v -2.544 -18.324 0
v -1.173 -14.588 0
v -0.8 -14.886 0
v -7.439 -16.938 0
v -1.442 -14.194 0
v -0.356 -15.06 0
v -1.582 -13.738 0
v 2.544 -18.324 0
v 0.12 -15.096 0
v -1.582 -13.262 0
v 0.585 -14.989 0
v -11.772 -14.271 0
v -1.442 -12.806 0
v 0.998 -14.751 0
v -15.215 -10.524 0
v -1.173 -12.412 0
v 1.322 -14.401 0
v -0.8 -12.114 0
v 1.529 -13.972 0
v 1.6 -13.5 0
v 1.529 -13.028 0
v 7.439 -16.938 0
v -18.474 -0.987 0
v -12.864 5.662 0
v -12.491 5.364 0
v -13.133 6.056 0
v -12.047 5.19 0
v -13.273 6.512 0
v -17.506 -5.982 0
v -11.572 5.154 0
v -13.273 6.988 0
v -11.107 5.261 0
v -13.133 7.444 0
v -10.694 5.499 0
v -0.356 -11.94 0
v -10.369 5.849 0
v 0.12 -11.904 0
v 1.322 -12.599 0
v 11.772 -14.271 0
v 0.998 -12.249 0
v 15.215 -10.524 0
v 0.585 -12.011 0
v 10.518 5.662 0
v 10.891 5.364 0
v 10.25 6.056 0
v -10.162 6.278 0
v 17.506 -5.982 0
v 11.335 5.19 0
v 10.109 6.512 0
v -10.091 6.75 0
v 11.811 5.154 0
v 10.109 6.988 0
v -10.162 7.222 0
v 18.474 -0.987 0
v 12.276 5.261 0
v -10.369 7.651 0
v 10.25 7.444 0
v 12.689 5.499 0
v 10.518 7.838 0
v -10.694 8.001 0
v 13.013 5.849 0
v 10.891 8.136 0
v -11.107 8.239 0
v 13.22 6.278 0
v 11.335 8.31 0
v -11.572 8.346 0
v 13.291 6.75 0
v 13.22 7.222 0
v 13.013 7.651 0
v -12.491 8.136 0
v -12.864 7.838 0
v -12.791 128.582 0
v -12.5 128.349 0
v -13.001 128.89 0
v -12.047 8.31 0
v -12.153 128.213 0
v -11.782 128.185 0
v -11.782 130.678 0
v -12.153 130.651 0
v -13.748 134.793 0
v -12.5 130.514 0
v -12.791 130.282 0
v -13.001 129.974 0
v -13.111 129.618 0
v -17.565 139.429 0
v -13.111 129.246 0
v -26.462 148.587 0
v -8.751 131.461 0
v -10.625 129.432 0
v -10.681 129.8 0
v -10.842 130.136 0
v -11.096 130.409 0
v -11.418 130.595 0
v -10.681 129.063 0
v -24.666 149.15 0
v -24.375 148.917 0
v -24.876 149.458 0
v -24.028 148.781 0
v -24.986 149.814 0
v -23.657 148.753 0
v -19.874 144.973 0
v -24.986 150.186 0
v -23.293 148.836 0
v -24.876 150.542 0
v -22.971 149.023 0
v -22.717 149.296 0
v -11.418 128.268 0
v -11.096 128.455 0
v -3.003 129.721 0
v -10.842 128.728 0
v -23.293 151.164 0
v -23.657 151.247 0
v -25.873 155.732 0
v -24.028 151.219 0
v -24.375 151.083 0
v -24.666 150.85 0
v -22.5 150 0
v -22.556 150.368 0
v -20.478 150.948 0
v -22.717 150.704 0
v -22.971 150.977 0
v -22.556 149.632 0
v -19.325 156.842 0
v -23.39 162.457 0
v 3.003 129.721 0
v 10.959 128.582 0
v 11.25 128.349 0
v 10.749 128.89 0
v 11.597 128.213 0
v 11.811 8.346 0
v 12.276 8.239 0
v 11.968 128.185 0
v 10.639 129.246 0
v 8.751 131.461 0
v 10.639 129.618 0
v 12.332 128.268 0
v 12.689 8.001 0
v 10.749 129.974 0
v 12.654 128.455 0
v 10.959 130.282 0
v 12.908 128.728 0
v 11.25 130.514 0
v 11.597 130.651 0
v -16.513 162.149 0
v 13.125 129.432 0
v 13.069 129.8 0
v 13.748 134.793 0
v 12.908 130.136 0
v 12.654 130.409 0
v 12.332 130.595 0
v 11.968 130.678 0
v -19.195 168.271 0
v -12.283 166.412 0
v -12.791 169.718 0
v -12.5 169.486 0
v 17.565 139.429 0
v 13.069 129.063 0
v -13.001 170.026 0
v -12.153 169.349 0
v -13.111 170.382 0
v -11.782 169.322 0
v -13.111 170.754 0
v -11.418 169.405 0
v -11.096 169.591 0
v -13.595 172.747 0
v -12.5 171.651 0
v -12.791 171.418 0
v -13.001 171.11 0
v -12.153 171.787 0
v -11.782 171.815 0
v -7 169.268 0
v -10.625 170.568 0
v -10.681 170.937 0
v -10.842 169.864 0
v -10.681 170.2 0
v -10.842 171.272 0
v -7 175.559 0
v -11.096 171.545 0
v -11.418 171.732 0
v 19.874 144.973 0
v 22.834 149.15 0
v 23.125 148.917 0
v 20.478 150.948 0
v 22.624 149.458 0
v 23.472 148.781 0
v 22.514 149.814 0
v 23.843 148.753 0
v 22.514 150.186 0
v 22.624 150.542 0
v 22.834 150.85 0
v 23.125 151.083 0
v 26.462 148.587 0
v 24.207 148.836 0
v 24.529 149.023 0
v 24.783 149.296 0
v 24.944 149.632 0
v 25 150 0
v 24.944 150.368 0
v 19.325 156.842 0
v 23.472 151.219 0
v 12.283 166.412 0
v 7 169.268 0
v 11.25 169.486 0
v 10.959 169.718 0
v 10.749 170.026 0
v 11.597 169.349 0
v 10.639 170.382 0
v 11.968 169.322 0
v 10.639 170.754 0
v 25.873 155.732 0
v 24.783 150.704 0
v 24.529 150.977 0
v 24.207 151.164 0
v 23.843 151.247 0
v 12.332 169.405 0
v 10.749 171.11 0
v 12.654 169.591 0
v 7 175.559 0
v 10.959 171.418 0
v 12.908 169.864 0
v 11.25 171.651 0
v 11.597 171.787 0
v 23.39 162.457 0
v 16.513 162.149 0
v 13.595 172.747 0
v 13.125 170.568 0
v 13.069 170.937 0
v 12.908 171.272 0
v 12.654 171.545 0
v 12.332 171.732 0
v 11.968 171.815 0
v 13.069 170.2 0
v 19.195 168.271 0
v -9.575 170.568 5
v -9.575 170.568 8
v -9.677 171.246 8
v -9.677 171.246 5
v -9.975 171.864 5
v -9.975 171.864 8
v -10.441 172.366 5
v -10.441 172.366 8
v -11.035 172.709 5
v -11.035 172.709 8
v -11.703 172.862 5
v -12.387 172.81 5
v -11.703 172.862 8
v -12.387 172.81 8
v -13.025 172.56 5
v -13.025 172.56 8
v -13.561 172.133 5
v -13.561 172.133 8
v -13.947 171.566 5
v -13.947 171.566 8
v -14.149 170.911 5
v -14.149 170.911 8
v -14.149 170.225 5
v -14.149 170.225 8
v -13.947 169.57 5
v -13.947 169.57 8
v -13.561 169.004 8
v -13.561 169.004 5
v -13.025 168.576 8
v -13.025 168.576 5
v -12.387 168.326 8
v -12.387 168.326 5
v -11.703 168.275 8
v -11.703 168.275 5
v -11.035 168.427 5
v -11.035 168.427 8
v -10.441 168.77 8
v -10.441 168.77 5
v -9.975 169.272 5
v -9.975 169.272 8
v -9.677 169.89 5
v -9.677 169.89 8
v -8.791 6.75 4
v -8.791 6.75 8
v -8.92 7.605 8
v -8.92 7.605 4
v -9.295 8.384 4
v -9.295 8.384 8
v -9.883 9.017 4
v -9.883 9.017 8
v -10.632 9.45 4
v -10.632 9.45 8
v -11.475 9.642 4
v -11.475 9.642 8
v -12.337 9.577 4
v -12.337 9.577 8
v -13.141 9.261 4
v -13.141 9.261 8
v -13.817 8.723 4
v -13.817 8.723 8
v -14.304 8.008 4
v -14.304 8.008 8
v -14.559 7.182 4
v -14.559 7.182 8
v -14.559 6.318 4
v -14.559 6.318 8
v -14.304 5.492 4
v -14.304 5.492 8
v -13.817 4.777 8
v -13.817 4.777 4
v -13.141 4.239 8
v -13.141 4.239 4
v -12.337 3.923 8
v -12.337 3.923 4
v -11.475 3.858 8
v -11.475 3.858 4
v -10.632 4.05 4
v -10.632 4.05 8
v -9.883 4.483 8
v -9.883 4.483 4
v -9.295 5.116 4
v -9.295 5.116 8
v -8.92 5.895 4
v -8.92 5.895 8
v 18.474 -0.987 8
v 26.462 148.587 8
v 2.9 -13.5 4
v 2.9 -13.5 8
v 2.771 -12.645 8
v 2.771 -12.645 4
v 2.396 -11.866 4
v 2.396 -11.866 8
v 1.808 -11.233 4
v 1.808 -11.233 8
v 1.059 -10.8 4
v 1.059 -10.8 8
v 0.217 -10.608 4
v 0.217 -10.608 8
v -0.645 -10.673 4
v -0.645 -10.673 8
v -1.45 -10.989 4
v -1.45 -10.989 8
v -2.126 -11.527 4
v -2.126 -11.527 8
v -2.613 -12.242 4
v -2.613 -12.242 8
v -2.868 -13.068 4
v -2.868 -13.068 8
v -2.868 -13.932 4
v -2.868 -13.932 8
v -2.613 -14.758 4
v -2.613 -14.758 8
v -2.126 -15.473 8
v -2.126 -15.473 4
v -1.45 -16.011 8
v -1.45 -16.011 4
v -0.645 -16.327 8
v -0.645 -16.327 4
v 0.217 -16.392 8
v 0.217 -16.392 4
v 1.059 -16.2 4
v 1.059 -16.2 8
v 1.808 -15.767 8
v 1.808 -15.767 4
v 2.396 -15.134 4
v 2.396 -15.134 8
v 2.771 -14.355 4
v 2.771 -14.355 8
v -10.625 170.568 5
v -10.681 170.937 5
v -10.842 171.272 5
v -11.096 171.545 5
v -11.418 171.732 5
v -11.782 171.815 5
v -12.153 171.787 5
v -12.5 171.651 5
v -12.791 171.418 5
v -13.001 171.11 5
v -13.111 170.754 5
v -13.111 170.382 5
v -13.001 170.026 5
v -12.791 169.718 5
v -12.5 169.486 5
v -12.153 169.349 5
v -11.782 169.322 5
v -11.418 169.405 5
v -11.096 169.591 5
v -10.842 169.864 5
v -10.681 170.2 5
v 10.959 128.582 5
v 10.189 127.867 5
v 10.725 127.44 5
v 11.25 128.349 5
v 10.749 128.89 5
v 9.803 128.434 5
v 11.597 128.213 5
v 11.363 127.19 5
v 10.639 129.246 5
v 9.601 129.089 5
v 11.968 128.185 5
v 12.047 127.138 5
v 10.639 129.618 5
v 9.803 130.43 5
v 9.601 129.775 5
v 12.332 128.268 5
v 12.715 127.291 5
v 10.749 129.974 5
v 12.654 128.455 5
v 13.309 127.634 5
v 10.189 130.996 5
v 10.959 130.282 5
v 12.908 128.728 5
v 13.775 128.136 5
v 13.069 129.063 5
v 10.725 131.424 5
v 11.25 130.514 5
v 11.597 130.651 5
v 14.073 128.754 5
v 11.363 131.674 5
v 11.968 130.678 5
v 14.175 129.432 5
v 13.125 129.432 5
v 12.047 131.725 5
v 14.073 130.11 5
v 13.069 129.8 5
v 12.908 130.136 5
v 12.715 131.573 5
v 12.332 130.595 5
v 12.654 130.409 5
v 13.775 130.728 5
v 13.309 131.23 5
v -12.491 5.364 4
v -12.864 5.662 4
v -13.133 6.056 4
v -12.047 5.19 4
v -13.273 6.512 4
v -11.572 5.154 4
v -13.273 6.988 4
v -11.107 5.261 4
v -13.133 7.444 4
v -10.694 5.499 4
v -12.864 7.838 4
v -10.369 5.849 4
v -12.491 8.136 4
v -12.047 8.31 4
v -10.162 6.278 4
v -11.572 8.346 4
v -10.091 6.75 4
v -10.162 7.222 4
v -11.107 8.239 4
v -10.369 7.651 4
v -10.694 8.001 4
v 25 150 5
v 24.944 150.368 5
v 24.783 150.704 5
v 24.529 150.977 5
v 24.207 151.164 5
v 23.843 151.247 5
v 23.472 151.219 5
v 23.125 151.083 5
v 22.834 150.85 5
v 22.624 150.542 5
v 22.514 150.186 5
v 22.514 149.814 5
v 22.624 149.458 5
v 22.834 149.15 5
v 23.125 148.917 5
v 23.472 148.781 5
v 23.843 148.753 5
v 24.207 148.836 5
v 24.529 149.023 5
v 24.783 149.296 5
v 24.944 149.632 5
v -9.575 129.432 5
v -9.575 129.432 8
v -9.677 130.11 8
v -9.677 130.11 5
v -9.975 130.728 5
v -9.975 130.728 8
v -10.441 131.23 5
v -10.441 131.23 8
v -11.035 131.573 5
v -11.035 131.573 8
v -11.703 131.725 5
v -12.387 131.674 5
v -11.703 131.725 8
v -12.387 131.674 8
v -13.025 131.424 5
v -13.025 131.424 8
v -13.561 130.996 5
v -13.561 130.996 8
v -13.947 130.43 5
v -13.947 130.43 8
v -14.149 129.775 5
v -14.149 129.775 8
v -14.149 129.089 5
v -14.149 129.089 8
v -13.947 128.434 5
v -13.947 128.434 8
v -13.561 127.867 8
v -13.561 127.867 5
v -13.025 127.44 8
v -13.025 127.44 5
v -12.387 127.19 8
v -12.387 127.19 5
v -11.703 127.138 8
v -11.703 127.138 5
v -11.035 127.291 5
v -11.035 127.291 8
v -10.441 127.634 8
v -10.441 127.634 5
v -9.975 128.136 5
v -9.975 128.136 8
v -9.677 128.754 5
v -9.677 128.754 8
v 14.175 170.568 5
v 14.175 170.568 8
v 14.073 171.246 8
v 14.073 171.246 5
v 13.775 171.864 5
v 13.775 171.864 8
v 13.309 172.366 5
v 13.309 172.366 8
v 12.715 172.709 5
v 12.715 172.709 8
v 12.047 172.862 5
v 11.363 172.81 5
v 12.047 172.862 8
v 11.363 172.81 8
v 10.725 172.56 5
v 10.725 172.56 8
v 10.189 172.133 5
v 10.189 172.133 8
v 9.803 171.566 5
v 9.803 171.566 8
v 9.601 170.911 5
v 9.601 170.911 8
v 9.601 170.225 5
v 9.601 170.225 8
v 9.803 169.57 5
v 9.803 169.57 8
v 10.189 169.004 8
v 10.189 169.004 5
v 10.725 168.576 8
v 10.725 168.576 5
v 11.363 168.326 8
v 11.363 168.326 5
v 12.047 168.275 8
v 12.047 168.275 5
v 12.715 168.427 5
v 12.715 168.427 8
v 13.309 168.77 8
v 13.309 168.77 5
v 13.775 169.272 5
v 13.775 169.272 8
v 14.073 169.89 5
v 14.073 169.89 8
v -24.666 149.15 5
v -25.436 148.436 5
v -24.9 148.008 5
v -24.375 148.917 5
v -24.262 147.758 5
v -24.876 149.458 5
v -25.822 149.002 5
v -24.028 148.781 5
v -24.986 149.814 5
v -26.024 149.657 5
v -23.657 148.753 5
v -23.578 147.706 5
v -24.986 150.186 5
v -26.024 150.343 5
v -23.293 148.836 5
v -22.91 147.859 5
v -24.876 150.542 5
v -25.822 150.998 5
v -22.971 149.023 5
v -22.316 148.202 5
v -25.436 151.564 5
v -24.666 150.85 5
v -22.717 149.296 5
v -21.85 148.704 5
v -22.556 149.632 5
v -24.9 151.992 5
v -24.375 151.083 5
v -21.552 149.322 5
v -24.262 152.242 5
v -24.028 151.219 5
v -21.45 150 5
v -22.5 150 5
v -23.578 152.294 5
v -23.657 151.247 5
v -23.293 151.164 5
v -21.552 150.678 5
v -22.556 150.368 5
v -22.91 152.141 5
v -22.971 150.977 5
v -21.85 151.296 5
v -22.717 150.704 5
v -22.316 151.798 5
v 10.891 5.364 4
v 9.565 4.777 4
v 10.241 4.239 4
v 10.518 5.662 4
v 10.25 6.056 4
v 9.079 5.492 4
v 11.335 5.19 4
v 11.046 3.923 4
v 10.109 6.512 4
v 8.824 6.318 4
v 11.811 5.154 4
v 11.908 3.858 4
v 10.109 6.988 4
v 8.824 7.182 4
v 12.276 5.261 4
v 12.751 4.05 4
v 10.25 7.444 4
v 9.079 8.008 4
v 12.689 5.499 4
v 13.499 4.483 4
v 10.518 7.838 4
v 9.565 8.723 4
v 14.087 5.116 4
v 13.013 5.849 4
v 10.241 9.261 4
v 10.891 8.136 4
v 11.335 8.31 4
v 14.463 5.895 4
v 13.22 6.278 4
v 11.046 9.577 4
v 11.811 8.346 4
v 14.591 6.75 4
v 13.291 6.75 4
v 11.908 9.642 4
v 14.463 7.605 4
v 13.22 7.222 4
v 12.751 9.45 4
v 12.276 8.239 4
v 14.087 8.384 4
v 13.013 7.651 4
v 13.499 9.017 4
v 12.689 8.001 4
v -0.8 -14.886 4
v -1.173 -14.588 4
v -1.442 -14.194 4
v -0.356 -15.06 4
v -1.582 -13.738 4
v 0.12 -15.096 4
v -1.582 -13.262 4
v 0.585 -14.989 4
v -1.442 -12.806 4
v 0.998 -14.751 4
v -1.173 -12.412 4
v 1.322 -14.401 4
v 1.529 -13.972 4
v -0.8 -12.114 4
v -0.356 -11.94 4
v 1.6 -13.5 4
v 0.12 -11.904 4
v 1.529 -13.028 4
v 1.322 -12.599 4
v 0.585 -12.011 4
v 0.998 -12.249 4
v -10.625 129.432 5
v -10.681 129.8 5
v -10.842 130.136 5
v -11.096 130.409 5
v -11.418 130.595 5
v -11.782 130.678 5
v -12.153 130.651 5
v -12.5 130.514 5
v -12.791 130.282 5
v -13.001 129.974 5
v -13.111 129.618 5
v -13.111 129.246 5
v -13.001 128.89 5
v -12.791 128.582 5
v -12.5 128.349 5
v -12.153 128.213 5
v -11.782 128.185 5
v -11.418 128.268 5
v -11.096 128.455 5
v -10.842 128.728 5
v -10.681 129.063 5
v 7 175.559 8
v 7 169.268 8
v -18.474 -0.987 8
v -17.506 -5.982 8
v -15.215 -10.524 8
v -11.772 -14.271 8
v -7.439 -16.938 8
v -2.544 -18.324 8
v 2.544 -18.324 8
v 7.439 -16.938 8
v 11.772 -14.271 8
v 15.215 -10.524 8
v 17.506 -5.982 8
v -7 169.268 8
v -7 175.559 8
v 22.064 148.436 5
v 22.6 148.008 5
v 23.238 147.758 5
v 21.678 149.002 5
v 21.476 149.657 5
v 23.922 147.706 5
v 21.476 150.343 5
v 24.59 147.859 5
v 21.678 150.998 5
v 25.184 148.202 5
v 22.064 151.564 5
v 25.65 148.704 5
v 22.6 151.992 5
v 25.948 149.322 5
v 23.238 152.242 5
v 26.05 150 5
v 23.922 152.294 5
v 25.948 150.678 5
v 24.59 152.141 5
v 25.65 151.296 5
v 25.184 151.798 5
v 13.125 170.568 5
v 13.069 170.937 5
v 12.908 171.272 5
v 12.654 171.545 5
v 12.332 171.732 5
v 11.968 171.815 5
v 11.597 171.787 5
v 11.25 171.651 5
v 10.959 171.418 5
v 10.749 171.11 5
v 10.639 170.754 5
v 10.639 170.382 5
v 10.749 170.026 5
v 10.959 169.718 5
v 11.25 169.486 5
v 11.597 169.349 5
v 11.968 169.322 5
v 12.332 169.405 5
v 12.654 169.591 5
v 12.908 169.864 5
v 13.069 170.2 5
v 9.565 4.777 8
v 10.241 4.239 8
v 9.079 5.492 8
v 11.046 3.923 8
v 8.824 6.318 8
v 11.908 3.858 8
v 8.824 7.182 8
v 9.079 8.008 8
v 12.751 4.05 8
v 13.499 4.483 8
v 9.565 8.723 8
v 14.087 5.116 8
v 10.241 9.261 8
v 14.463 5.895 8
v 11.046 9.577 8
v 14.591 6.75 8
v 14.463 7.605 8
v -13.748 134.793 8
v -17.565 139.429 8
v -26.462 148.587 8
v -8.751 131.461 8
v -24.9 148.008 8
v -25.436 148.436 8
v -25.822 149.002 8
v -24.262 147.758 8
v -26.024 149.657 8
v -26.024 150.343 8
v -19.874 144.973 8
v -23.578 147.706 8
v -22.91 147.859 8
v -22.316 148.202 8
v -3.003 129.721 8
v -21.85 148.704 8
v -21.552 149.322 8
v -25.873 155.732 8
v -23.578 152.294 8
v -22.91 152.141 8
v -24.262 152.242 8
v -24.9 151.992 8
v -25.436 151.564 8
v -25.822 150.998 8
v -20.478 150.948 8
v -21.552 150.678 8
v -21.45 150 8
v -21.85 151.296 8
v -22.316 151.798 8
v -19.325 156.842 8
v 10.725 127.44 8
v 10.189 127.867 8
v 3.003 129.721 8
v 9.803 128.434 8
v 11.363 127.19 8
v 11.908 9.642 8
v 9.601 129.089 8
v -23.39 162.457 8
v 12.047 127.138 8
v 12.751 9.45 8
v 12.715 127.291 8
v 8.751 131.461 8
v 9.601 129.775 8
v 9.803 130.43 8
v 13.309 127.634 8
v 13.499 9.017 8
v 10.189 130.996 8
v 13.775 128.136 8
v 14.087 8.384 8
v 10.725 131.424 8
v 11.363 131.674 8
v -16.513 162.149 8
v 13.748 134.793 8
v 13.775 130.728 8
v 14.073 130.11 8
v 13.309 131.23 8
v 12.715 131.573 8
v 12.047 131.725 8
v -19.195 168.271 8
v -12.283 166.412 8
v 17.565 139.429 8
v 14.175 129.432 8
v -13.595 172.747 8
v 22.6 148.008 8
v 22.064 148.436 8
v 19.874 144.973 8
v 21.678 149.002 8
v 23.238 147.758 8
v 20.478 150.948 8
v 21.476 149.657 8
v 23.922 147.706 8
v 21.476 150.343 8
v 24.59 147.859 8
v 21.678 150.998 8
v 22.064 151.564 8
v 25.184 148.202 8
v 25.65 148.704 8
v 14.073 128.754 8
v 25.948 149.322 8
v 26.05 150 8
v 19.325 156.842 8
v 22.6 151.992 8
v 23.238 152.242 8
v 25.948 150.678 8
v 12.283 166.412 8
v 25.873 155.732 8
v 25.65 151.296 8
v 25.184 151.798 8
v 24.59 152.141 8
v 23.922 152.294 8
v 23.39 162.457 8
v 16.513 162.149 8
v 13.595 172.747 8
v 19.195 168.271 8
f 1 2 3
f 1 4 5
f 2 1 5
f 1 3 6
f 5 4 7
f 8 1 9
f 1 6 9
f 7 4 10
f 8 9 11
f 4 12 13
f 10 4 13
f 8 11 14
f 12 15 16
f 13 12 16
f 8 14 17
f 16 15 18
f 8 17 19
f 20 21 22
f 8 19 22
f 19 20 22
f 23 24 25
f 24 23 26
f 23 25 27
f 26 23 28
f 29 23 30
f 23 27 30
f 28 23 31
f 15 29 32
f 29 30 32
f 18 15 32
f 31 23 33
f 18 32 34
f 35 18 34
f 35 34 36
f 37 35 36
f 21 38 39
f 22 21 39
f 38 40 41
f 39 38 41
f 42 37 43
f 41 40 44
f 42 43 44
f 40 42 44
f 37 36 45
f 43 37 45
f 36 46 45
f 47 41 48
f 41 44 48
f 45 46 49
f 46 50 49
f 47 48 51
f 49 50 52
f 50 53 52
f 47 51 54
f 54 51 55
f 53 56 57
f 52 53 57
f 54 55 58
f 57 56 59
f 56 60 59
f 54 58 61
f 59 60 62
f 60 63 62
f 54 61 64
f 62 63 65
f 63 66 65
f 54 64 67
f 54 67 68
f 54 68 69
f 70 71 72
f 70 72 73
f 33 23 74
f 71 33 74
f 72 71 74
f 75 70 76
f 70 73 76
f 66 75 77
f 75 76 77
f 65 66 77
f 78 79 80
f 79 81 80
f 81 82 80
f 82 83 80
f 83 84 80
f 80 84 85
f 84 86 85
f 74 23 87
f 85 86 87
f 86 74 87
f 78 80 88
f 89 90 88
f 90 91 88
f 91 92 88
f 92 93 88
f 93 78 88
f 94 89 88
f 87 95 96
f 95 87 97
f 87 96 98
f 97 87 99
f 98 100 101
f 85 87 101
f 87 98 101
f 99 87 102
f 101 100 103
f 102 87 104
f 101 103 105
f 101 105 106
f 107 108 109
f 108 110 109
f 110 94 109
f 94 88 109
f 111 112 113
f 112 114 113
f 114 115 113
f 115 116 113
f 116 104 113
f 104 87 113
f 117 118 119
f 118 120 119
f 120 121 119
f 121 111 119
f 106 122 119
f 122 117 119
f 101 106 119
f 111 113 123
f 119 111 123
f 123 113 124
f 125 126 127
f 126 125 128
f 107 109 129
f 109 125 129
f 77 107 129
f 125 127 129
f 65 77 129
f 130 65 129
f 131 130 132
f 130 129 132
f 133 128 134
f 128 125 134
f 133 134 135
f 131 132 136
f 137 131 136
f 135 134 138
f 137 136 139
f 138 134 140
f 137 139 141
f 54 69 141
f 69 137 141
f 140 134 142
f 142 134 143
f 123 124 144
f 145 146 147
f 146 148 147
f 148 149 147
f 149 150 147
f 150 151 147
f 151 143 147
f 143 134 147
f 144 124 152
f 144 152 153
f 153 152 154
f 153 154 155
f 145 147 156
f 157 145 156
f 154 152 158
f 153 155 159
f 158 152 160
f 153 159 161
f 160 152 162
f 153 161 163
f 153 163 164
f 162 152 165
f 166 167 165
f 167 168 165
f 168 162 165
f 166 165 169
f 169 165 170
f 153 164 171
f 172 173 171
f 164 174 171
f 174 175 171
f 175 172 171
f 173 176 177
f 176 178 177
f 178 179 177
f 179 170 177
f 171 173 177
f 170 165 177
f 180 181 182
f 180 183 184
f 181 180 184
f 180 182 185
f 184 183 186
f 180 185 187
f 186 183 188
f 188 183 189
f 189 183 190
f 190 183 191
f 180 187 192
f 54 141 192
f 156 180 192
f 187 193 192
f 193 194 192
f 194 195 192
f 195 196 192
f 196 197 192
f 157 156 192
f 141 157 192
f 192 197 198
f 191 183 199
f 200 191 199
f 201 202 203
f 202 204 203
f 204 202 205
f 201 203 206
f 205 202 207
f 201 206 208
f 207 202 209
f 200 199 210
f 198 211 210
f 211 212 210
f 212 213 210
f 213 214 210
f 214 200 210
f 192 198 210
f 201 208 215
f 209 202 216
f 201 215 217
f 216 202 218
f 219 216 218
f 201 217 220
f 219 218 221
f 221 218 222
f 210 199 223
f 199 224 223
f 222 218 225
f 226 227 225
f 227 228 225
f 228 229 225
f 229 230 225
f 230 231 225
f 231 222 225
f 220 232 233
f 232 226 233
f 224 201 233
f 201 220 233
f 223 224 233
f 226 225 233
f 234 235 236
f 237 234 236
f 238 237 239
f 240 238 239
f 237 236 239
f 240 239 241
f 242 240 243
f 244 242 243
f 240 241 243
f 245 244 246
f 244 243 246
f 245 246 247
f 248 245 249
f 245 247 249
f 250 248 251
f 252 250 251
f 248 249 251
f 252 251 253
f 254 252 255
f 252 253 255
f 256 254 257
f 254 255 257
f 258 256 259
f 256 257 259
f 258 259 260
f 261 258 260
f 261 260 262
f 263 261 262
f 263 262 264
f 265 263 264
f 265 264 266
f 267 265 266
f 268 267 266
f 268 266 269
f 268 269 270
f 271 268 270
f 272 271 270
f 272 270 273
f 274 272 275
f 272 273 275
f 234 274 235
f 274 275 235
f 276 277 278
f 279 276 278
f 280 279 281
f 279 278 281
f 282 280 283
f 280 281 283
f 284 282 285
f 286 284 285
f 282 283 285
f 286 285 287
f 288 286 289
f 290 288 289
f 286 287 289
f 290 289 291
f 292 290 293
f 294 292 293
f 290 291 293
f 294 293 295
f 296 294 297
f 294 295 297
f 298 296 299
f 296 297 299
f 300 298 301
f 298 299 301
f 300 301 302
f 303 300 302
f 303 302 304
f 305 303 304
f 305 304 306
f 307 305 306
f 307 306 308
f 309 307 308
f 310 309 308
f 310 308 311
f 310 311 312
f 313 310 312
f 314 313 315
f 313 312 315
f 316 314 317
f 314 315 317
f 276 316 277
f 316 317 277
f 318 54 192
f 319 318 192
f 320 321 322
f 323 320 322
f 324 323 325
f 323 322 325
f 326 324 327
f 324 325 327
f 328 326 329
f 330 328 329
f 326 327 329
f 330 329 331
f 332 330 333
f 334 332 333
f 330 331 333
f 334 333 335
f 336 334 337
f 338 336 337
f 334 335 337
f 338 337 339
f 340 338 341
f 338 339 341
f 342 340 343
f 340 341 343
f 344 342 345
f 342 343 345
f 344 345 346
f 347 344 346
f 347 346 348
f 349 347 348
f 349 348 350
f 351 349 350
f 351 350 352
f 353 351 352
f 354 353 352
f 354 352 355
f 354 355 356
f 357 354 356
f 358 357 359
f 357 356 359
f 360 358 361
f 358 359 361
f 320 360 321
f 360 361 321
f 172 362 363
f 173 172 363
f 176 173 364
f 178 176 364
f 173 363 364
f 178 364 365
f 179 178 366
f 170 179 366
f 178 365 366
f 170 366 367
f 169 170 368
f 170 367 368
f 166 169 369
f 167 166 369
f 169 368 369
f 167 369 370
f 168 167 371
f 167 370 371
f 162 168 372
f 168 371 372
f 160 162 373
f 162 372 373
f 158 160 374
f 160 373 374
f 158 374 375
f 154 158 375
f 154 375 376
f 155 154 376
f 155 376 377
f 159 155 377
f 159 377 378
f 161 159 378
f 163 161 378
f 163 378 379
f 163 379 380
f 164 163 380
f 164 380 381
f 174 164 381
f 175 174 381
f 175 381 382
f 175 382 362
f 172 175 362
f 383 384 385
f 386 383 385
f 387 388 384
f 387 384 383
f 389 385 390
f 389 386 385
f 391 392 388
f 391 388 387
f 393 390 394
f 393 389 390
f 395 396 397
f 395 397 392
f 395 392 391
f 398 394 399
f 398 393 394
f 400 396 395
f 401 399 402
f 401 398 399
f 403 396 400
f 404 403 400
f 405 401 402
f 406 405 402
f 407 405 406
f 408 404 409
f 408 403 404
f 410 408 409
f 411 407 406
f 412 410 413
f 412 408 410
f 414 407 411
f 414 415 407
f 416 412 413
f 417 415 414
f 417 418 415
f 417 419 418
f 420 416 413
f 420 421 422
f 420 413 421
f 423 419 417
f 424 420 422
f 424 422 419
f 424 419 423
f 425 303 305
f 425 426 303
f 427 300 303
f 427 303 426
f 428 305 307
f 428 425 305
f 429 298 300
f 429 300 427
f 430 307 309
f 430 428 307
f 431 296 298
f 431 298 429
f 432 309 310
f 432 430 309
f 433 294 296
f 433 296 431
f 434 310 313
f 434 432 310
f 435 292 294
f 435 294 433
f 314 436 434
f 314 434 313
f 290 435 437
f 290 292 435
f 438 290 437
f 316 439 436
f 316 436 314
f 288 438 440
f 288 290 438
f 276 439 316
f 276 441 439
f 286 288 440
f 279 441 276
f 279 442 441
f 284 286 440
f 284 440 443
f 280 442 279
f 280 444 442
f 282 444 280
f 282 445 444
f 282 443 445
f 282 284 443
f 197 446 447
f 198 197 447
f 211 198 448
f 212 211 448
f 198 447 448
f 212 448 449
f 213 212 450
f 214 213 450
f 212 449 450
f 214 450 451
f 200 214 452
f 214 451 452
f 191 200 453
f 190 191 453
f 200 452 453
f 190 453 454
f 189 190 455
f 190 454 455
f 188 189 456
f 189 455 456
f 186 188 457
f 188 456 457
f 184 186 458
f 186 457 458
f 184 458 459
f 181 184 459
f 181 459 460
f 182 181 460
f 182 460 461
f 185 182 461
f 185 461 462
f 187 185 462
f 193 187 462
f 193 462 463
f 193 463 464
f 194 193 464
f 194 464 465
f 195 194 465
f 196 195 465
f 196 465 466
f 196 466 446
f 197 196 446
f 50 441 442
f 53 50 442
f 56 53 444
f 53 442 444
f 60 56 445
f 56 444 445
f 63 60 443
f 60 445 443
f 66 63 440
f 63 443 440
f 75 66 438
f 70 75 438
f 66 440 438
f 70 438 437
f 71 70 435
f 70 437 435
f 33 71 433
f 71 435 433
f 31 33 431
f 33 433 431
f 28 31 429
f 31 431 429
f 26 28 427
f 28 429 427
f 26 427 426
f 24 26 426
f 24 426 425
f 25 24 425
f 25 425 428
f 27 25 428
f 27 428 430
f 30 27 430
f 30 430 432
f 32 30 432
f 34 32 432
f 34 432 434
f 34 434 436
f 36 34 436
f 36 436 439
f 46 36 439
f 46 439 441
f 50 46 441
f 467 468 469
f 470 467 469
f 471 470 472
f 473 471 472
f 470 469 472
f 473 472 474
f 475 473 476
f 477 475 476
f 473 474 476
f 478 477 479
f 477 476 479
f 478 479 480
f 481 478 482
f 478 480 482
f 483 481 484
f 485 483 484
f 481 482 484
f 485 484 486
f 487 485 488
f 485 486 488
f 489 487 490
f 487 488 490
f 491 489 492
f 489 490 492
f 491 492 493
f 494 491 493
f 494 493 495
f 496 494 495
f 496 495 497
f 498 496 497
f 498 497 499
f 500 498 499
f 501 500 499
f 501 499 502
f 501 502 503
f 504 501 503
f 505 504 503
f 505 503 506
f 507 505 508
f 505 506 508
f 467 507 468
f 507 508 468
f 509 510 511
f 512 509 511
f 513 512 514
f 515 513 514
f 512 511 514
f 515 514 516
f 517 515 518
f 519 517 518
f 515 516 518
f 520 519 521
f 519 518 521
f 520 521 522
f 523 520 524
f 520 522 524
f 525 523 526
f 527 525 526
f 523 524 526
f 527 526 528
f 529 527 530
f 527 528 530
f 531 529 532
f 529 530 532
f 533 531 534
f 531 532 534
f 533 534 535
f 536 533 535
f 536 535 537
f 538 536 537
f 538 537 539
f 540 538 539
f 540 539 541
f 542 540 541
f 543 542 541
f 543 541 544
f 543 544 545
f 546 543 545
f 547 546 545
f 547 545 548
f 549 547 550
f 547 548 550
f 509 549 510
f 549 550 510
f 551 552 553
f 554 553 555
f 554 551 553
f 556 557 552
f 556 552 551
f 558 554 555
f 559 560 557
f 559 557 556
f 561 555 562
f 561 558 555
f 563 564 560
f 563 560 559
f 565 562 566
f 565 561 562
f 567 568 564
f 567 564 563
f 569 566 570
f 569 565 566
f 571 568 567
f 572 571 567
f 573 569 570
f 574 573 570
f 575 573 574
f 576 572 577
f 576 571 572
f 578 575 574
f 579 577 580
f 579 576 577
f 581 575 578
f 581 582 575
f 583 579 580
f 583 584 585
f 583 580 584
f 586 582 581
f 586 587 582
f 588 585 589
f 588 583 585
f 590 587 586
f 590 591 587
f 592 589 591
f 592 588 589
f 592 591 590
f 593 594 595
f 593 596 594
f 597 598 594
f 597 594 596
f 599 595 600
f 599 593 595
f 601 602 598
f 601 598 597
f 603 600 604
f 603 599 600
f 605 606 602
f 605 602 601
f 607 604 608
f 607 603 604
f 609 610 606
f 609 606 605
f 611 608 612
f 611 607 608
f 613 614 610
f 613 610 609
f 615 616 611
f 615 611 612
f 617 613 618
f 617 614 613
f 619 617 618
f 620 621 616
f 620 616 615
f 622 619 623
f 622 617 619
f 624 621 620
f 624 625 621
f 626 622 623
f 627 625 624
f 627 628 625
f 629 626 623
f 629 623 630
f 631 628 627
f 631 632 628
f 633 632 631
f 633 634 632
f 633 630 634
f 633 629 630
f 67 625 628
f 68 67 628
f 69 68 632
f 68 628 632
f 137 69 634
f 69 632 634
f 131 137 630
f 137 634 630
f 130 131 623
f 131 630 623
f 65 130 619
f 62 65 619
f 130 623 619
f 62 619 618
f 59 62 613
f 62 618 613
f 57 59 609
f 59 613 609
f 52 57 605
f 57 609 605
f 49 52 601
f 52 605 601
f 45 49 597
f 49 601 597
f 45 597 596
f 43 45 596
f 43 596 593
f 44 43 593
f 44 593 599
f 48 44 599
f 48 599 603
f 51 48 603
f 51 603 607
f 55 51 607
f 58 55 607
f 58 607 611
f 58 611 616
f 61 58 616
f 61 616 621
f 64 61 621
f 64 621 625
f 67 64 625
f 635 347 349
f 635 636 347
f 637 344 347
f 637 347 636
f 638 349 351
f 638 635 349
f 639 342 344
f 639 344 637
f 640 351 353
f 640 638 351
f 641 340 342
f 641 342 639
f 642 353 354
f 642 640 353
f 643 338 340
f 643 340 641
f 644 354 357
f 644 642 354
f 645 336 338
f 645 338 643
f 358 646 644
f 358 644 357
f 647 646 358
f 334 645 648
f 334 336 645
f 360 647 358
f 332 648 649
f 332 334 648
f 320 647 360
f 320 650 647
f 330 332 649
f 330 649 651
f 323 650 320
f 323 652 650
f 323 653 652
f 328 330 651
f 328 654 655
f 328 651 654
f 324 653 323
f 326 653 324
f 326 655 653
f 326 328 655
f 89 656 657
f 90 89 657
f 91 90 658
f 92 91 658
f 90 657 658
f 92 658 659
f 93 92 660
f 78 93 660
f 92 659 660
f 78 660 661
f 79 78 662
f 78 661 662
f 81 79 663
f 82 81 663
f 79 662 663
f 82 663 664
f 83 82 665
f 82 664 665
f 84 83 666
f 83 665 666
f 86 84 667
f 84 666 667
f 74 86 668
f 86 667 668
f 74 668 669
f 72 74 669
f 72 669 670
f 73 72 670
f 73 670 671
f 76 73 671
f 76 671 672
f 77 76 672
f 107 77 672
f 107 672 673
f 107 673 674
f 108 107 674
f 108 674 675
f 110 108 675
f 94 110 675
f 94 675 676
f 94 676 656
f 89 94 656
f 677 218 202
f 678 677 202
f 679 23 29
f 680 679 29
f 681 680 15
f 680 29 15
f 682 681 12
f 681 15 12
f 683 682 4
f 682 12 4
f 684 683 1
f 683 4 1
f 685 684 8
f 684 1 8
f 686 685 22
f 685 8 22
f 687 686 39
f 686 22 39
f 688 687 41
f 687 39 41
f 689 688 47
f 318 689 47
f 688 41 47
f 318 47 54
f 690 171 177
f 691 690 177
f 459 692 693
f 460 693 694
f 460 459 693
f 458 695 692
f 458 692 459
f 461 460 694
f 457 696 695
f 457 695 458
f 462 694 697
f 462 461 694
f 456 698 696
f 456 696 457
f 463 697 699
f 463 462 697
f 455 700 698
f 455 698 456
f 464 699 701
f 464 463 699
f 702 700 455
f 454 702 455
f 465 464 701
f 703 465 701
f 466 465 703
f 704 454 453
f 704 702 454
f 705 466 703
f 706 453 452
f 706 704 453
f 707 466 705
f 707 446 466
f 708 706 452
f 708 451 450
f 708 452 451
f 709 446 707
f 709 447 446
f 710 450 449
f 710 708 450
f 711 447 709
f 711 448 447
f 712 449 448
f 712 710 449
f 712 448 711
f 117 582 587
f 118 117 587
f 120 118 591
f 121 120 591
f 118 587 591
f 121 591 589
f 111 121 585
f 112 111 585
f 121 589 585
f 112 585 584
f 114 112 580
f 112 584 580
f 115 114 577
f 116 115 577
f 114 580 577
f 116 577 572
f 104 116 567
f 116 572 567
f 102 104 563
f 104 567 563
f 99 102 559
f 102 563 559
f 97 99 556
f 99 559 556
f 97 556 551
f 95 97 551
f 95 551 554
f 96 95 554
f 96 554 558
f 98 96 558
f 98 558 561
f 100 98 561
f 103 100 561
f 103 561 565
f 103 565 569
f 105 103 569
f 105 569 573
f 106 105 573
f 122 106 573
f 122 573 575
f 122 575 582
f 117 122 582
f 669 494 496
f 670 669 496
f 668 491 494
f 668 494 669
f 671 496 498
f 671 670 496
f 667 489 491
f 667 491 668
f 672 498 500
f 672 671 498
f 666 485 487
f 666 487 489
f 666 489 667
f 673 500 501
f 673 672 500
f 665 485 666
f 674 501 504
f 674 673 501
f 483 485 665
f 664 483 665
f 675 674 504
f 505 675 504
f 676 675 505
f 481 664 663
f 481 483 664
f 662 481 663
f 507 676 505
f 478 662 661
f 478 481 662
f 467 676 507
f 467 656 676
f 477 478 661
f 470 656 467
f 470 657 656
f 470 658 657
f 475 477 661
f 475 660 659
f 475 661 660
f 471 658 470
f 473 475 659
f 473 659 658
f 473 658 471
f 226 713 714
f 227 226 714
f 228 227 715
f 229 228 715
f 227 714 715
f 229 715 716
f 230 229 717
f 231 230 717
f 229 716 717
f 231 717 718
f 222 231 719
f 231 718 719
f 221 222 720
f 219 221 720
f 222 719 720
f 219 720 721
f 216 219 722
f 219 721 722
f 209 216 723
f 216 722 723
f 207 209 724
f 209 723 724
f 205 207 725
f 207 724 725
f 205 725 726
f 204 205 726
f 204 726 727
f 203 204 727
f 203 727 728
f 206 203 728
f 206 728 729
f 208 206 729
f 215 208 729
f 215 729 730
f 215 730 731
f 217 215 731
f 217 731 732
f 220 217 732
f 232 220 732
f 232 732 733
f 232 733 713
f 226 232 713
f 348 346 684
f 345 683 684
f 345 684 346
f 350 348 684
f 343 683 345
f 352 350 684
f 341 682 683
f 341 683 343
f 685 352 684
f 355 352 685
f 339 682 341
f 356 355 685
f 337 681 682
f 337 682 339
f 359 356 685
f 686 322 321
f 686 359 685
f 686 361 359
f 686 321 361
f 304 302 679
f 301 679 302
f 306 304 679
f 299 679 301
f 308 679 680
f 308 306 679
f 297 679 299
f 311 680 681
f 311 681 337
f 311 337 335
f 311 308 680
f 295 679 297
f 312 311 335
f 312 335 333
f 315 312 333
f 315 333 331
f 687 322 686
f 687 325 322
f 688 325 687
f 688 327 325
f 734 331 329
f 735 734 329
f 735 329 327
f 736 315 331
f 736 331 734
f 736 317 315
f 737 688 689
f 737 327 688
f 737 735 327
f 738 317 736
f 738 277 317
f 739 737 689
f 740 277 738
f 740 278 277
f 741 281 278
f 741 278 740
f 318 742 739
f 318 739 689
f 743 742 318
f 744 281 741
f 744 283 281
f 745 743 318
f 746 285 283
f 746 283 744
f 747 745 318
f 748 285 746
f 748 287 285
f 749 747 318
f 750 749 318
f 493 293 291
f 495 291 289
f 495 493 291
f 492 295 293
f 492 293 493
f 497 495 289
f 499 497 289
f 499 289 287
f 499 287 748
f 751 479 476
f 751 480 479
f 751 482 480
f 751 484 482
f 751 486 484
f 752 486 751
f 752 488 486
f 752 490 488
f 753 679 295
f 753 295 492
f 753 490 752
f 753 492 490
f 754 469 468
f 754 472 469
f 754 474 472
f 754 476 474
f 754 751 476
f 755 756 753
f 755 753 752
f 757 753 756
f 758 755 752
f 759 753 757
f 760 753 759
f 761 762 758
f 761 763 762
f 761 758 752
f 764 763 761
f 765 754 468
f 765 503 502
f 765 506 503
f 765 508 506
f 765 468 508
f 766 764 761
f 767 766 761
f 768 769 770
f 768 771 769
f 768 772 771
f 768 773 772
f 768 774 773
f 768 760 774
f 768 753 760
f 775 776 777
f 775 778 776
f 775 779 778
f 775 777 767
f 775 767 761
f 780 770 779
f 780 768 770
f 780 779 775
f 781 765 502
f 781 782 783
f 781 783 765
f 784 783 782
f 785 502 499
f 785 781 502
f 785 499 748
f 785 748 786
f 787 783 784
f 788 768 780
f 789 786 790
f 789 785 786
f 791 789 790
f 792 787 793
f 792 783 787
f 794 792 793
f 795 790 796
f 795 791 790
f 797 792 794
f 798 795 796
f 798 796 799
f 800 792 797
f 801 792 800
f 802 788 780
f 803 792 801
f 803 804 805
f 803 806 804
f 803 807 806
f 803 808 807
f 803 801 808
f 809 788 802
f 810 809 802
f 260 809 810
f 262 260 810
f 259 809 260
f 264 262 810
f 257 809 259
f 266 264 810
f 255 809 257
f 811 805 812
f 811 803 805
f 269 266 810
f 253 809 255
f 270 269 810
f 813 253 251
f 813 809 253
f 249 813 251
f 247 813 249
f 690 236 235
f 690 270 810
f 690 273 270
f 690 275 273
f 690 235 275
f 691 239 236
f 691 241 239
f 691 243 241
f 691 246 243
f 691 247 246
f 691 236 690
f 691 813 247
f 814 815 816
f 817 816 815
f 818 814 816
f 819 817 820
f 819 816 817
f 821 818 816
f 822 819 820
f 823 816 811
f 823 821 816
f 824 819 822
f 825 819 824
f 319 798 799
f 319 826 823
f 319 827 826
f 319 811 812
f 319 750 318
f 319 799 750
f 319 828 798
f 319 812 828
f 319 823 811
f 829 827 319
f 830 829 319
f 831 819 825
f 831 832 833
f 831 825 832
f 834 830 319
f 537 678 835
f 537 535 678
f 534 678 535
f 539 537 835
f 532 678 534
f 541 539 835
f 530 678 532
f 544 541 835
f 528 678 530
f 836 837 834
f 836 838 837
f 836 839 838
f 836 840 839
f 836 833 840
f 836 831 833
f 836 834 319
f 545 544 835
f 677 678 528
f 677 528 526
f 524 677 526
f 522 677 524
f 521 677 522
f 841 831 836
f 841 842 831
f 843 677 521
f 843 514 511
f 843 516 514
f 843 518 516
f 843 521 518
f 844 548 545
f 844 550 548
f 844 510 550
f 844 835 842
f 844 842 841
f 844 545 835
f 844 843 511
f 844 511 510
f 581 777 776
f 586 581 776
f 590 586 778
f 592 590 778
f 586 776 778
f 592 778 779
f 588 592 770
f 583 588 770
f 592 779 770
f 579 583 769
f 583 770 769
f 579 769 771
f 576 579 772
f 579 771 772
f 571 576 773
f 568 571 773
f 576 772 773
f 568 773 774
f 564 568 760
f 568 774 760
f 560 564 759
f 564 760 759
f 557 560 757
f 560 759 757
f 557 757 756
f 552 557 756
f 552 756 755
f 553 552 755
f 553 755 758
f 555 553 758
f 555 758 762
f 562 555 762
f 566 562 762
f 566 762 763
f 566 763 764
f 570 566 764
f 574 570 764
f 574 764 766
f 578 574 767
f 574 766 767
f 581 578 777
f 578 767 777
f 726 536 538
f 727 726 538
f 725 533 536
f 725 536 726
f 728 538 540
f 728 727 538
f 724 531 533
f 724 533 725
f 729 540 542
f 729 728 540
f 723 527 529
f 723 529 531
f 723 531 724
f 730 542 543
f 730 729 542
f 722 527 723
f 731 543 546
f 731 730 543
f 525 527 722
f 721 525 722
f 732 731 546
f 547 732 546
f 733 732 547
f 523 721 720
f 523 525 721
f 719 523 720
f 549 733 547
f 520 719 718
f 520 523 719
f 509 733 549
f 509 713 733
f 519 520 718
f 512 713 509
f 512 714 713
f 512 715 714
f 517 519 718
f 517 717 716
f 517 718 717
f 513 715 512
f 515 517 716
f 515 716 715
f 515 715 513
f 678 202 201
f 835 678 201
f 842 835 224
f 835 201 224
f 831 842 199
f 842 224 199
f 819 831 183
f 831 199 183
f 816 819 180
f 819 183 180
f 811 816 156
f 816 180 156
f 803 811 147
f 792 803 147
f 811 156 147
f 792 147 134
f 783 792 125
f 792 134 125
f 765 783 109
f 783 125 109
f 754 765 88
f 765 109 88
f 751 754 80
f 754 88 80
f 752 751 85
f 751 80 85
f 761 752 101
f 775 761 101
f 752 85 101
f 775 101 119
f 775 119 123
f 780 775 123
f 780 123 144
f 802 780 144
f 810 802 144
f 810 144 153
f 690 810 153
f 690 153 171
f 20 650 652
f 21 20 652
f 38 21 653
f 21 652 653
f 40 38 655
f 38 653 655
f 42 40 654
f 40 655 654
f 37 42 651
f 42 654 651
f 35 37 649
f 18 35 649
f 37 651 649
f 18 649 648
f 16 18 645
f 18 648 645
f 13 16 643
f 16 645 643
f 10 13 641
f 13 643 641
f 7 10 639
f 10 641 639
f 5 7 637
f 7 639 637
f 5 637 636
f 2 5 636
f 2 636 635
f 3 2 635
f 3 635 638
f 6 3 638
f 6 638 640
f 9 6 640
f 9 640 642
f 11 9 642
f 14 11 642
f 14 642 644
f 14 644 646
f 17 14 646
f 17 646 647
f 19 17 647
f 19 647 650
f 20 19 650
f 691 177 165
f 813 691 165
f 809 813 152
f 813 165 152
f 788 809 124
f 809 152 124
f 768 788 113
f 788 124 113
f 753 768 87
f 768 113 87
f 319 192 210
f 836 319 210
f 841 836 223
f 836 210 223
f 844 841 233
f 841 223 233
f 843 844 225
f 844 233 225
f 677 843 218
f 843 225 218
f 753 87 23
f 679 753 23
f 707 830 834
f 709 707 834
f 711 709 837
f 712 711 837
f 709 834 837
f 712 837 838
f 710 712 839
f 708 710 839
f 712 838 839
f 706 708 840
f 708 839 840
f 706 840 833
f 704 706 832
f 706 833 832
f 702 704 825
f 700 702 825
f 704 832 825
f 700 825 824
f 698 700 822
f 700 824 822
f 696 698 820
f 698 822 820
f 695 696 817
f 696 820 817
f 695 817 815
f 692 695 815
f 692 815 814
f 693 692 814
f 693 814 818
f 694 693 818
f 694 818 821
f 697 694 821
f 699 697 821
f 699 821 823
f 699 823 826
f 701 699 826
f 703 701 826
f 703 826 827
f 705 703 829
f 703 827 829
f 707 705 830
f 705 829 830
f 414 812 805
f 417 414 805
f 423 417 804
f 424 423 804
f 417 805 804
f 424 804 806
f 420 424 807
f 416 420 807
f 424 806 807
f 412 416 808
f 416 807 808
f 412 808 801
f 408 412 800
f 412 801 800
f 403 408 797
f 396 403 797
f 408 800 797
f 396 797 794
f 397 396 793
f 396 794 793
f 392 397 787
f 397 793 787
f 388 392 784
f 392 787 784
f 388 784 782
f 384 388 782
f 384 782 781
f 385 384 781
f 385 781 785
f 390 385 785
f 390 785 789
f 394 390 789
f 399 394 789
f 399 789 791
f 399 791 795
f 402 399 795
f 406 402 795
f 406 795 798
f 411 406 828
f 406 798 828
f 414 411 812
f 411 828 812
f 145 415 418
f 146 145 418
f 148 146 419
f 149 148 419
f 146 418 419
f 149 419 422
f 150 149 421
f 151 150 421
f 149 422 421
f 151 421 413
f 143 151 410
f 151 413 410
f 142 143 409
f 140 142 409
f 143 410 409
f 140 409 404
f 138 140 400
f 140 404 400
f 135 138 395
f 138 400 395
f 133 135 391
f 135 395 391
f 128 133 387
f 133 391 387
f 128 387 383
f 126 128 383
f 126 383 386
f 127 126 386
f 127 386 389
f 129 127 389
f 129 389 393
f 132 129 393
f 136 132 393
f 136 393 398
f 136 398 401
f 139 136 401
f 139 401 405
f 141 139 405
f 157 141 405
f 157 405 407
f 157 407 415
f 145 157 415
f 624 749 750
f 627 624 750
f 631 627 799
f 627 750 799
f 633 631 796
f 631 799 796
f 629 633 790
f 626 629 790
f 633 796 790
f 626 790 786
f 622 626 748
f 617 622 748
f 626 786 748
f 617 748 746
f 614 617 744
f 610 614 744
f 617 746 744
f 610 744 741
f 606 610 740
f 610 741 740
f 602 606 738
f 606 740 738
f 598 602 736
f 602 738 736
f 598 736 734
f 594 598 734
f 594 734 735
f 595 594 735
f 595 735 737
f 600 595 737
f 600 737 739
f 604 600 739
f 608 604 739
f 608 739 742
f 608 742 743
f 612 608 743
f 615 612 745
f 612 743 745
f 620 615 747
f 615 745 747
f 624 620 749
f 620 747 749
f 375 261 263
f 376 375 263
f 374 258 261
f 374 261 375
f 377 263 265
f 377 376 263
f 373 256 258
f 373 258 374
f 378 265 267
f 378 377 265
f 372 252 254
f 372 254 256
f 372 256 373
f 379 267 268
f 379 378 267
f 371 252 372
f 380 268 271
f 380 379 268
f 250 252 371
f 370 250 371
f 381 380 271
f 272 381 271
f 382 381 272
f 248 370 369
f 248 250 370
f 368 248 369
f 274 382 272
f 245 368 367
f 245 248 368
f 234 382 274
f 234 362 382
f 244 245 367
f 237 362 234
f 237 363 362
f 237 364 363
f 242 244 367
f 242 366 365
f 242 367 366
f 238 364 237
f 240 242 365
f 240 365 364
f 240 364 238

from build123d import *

# Parameters (mm, degrees)
BOSS_EXTRUDE1_DEPTH = 8
SKETCH7_R           = 1.6
CUT_EXTRUDE2_DEPTH  = 8
SKETCH12_R          = 1.25
CUT_EXTRUDE6_DEPTH  = 10
SKETCH13_R          = 2.9
CUT_EXTRUDE7_DEPTH  = 4
SKETCH14_R          = 2.3
CUT_EXTRUDE8_DEPTH  = 3


with BuildPart() as part:
    # Sketch4 → Boss-Extrude1 (new body)
    with BuildSketch(Plane.XY):
        with BuildLine():
            Line((-26.462284272, 148.586666667), (-18.473670152, -0.986666667))
            ThreePointArc((-18.473670152, -0.986666667), (0, -18.5), (18.473670152, -0.986666667))
            Line((18.473670152, -0.986666667), (26.462284272, 148.586666667))
            ThreePointArc((26.462284272, 148.586666667), (21.489637404, 165.506304662), (7, 175.558755838))
            Line((7, 175.558755838), (7, 169.267848868))
            ThreePointArc((7, 169.267848868), (0, 129.5), (-7, 169.267848868))
            Line((-7, 169.267848868), (-7, 175.558755838))
            ThreePointArc((-7, 175.558755838), (-21.489637404, 165.506304662), (-26.462284272, 148.586666667))
        make_face()
    extrude(amount=BOSS_EXTRUDE1_DEPTH)

    # Sketch7 → Cut-Extrude2 (cut)
    with BuildSketch(Plane.XY.offset(8)):
        with Locations((0, -13.5)):
            Circle(SKETCH7_R)
        with Locations((-11.691342951, 6.75)):
            Circle(SKETCH7_R)
        with Locations((11.691342951, 6.75)):
            Circle(SKETCH7_R)
    extrude(amount=-CUT_EXTRUDE2_DEPTH, mode=Mode.SUBTRACT)

    # Sketch12 → Cut-Extrude6 (cut)
    with BuildSketch(Plane.XY.offset(8)):
        with Locations((23.75, 150)):
            Circle(SKETCH12_R)
        with Locations((11.875, 129.43189666)):
            Circle(SKETCH12_R)
        with Locations((-11.875, 129.43189666)):
            Circle(SKETCH12_R)
        with Locations((-23.75, 150)):
            Circle(SKETCH12_R)
        with Locations((-11.875, 170.56810334)):
            Circle(SKETCH12_R)
        with Locations((11.875, 170.56810334)):
            Circle(SKETCH12_R)
    extrude(amount=-CUT_EXTRUDE6_DEPTH, mode=Mode.SUBTRACT)

    # Sketch13 → Cut-Extrude7 (cut)
    with BuildSketch(Plane.XY.offset(8)):
        with Locations((-11.691342951, 6.75)):
            Circle(SKETCH13_R)
        with Locations((11.691342951, 6.75)):
            Circle(SKETCH13_R)
        with Locations((0, -13.5)):
            Circle(SKETCH13_R)
    extrude(amount=-CUT_EXTRUDE7_DEPTH, mode=Mode.SUBTRACT)

    # Sketch14 → Cut-Extrude8 (cut)
    with BuildSketch(Plane.XY.offset(8)):
        with Locations((23.75, 150)):
            Circle(SKETCH14_R)
        with Locations((11.875, 129.43189666)):
            Circle(SKETCH14_R)
        with Locations((-11.875, 129.43189666)):
            Circle(SKETCH14_R)
        with Locations((-23.75, 150)):
            Circle(SKETCH14_R)
        with Locations((-11.875, 170.56810334)):
            Circle(SKETCH14_R)
        with Locations((11.875, 170.56810334)):
            Circle(SKETCH14_R)
    extrude(amount=-CUT_EXTRUDE8_DEPTH, mode=Mode.SUBTRACT)


solid = part.part
